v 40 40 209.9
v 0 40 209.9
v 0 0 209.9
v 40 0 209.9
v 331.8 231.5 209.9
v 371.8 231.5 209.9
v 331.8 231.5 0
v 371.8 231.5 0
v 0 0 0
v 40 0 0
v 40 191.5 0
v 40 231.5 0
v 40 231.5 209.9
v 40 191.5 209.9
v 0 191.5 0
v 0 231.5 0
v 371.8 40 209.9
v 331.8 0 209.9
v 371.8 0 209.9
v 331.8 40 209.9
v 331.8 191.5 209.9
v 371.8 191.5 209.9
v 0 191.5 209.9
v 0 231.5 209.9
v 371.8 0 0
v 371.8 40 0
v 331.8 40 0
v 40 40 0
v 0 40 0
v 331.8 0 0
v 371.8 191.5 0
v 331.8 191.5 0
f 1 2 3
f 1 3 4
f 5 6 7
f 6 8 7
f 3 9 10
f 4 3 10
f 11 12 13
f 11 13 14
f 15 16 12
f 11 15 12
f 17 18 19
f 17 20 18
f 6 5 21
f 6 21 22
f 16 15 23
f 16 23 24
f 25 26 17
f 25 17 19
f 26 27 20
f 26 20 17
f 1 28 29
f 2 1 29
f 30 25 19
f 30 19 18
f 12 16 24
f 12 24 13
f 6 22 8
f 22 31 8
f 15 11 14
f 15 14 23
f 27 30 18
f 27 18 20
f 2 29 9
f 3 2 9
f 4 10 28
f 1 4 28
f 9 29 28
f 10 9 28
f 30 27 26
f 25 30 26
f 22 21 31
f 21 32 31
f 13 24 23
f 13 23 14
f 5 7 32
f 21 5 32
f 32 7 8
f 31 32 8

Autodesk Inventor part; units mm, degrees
sketch "Sketch1" plane through (0, 0, 0) normal (0, 0, 1) x (1, 0, 0)
  line L0 (371.8, 0) -> (0, 0) construction
  line L1 (0, 0) -> (0, 40) construction
  line L2 (371.8, 40) -> (0, 40) construction
  line L3 (371.8, 0) -> (371.8, 40) construction
  line L4 (0, 0) -> (40, 0) construction
  line L5 (40, 0) -> (40, 40)
  line L6 (40, 40) -> (0, 40) construction
  line L7 (0, 40) -> (0, 0) construction
  line L8 (185.9, 0) -> (185.9, 231.5) construction
  line L9 (371.8, 231.5) -> (0, 231.5) construction
  line L10 (371.8, 191.4) -> (371.8, 40.1) construction
  line L11 (0, 191.4) -> (0, 40.1) construction
  line L12 (371.8, 115.75) -> (0, 115.75) construction
  line L13 (40, 40) -> (0, 40)
  line L14 (0, 40) -> (0, 0)
  line L15 (0, 0) -> (40, 0)
  line L16 (40, 0) -> (40, 40)
  line L17 (0, 231.5) -> (40, 231.5)
  line L18 (40, 231.5) -> (40, 191.5)
  line L19 (40, 191.5) -> (0, 191.5)
  line L20 (0, 191.5) -> (0, 231.5)
  line L21 (371.8, 0) -> (371.8, 40) construction
  line L22 (371.8, 0) -> (331.8, 0) construction
  line L23 (331.8, 0) -> (331.8, 40)
  line L24 (331.8, 40) -> (371.8, 40) construction
  line L25 (371.8, 40) -> (371.8, 0) construction
  line L26 (371.8, 191.4) -> (371.8, 40.1) construction
  line L27 (331.8, 40) -> (371.8, 40)
  line L28 (371.8, 40) -> (371.8, 0)
  line L29 (371.8, 0) -> (331.8, 0)
  line L30 (331.8, 0) -> (331.8, 40)
  line L31 (371.8, 231.5) -> (331.8, 231.5)
  line L32 (331.8, 231.5) -> (331.8, 191.5)
  line L33 (331.8, 191.5) -> (371.8, 191.5)
  line L34 (371.8, 191.5) -> (371.8, 231.5)
  dimension "d0" = 40
  dimension "d1" = 40
  dimension "d2" = 40
ref_plane "Work Plane1" through (-749.4514, -2, 159.9) normal (0, 0, -1) x (0, 1, 0)
ref_plane "Work Plane2" through (0, 0, 259.9) normal (0, 0, -1) x (0, 1, 0)
ref_plane "Work Plane3" through (0, 0, 159.9) normal (0, 0, -1) x (0, 1, 0)
ref_plane "Work Plane4" through (0, 0, 209.9) normal (0, 0, -1) x (0, 1, 0)
extrude "Extrusion1" add sketch "Sketch1" along normal up to surface (209.9 mm away)
properties part number "Z bars"
